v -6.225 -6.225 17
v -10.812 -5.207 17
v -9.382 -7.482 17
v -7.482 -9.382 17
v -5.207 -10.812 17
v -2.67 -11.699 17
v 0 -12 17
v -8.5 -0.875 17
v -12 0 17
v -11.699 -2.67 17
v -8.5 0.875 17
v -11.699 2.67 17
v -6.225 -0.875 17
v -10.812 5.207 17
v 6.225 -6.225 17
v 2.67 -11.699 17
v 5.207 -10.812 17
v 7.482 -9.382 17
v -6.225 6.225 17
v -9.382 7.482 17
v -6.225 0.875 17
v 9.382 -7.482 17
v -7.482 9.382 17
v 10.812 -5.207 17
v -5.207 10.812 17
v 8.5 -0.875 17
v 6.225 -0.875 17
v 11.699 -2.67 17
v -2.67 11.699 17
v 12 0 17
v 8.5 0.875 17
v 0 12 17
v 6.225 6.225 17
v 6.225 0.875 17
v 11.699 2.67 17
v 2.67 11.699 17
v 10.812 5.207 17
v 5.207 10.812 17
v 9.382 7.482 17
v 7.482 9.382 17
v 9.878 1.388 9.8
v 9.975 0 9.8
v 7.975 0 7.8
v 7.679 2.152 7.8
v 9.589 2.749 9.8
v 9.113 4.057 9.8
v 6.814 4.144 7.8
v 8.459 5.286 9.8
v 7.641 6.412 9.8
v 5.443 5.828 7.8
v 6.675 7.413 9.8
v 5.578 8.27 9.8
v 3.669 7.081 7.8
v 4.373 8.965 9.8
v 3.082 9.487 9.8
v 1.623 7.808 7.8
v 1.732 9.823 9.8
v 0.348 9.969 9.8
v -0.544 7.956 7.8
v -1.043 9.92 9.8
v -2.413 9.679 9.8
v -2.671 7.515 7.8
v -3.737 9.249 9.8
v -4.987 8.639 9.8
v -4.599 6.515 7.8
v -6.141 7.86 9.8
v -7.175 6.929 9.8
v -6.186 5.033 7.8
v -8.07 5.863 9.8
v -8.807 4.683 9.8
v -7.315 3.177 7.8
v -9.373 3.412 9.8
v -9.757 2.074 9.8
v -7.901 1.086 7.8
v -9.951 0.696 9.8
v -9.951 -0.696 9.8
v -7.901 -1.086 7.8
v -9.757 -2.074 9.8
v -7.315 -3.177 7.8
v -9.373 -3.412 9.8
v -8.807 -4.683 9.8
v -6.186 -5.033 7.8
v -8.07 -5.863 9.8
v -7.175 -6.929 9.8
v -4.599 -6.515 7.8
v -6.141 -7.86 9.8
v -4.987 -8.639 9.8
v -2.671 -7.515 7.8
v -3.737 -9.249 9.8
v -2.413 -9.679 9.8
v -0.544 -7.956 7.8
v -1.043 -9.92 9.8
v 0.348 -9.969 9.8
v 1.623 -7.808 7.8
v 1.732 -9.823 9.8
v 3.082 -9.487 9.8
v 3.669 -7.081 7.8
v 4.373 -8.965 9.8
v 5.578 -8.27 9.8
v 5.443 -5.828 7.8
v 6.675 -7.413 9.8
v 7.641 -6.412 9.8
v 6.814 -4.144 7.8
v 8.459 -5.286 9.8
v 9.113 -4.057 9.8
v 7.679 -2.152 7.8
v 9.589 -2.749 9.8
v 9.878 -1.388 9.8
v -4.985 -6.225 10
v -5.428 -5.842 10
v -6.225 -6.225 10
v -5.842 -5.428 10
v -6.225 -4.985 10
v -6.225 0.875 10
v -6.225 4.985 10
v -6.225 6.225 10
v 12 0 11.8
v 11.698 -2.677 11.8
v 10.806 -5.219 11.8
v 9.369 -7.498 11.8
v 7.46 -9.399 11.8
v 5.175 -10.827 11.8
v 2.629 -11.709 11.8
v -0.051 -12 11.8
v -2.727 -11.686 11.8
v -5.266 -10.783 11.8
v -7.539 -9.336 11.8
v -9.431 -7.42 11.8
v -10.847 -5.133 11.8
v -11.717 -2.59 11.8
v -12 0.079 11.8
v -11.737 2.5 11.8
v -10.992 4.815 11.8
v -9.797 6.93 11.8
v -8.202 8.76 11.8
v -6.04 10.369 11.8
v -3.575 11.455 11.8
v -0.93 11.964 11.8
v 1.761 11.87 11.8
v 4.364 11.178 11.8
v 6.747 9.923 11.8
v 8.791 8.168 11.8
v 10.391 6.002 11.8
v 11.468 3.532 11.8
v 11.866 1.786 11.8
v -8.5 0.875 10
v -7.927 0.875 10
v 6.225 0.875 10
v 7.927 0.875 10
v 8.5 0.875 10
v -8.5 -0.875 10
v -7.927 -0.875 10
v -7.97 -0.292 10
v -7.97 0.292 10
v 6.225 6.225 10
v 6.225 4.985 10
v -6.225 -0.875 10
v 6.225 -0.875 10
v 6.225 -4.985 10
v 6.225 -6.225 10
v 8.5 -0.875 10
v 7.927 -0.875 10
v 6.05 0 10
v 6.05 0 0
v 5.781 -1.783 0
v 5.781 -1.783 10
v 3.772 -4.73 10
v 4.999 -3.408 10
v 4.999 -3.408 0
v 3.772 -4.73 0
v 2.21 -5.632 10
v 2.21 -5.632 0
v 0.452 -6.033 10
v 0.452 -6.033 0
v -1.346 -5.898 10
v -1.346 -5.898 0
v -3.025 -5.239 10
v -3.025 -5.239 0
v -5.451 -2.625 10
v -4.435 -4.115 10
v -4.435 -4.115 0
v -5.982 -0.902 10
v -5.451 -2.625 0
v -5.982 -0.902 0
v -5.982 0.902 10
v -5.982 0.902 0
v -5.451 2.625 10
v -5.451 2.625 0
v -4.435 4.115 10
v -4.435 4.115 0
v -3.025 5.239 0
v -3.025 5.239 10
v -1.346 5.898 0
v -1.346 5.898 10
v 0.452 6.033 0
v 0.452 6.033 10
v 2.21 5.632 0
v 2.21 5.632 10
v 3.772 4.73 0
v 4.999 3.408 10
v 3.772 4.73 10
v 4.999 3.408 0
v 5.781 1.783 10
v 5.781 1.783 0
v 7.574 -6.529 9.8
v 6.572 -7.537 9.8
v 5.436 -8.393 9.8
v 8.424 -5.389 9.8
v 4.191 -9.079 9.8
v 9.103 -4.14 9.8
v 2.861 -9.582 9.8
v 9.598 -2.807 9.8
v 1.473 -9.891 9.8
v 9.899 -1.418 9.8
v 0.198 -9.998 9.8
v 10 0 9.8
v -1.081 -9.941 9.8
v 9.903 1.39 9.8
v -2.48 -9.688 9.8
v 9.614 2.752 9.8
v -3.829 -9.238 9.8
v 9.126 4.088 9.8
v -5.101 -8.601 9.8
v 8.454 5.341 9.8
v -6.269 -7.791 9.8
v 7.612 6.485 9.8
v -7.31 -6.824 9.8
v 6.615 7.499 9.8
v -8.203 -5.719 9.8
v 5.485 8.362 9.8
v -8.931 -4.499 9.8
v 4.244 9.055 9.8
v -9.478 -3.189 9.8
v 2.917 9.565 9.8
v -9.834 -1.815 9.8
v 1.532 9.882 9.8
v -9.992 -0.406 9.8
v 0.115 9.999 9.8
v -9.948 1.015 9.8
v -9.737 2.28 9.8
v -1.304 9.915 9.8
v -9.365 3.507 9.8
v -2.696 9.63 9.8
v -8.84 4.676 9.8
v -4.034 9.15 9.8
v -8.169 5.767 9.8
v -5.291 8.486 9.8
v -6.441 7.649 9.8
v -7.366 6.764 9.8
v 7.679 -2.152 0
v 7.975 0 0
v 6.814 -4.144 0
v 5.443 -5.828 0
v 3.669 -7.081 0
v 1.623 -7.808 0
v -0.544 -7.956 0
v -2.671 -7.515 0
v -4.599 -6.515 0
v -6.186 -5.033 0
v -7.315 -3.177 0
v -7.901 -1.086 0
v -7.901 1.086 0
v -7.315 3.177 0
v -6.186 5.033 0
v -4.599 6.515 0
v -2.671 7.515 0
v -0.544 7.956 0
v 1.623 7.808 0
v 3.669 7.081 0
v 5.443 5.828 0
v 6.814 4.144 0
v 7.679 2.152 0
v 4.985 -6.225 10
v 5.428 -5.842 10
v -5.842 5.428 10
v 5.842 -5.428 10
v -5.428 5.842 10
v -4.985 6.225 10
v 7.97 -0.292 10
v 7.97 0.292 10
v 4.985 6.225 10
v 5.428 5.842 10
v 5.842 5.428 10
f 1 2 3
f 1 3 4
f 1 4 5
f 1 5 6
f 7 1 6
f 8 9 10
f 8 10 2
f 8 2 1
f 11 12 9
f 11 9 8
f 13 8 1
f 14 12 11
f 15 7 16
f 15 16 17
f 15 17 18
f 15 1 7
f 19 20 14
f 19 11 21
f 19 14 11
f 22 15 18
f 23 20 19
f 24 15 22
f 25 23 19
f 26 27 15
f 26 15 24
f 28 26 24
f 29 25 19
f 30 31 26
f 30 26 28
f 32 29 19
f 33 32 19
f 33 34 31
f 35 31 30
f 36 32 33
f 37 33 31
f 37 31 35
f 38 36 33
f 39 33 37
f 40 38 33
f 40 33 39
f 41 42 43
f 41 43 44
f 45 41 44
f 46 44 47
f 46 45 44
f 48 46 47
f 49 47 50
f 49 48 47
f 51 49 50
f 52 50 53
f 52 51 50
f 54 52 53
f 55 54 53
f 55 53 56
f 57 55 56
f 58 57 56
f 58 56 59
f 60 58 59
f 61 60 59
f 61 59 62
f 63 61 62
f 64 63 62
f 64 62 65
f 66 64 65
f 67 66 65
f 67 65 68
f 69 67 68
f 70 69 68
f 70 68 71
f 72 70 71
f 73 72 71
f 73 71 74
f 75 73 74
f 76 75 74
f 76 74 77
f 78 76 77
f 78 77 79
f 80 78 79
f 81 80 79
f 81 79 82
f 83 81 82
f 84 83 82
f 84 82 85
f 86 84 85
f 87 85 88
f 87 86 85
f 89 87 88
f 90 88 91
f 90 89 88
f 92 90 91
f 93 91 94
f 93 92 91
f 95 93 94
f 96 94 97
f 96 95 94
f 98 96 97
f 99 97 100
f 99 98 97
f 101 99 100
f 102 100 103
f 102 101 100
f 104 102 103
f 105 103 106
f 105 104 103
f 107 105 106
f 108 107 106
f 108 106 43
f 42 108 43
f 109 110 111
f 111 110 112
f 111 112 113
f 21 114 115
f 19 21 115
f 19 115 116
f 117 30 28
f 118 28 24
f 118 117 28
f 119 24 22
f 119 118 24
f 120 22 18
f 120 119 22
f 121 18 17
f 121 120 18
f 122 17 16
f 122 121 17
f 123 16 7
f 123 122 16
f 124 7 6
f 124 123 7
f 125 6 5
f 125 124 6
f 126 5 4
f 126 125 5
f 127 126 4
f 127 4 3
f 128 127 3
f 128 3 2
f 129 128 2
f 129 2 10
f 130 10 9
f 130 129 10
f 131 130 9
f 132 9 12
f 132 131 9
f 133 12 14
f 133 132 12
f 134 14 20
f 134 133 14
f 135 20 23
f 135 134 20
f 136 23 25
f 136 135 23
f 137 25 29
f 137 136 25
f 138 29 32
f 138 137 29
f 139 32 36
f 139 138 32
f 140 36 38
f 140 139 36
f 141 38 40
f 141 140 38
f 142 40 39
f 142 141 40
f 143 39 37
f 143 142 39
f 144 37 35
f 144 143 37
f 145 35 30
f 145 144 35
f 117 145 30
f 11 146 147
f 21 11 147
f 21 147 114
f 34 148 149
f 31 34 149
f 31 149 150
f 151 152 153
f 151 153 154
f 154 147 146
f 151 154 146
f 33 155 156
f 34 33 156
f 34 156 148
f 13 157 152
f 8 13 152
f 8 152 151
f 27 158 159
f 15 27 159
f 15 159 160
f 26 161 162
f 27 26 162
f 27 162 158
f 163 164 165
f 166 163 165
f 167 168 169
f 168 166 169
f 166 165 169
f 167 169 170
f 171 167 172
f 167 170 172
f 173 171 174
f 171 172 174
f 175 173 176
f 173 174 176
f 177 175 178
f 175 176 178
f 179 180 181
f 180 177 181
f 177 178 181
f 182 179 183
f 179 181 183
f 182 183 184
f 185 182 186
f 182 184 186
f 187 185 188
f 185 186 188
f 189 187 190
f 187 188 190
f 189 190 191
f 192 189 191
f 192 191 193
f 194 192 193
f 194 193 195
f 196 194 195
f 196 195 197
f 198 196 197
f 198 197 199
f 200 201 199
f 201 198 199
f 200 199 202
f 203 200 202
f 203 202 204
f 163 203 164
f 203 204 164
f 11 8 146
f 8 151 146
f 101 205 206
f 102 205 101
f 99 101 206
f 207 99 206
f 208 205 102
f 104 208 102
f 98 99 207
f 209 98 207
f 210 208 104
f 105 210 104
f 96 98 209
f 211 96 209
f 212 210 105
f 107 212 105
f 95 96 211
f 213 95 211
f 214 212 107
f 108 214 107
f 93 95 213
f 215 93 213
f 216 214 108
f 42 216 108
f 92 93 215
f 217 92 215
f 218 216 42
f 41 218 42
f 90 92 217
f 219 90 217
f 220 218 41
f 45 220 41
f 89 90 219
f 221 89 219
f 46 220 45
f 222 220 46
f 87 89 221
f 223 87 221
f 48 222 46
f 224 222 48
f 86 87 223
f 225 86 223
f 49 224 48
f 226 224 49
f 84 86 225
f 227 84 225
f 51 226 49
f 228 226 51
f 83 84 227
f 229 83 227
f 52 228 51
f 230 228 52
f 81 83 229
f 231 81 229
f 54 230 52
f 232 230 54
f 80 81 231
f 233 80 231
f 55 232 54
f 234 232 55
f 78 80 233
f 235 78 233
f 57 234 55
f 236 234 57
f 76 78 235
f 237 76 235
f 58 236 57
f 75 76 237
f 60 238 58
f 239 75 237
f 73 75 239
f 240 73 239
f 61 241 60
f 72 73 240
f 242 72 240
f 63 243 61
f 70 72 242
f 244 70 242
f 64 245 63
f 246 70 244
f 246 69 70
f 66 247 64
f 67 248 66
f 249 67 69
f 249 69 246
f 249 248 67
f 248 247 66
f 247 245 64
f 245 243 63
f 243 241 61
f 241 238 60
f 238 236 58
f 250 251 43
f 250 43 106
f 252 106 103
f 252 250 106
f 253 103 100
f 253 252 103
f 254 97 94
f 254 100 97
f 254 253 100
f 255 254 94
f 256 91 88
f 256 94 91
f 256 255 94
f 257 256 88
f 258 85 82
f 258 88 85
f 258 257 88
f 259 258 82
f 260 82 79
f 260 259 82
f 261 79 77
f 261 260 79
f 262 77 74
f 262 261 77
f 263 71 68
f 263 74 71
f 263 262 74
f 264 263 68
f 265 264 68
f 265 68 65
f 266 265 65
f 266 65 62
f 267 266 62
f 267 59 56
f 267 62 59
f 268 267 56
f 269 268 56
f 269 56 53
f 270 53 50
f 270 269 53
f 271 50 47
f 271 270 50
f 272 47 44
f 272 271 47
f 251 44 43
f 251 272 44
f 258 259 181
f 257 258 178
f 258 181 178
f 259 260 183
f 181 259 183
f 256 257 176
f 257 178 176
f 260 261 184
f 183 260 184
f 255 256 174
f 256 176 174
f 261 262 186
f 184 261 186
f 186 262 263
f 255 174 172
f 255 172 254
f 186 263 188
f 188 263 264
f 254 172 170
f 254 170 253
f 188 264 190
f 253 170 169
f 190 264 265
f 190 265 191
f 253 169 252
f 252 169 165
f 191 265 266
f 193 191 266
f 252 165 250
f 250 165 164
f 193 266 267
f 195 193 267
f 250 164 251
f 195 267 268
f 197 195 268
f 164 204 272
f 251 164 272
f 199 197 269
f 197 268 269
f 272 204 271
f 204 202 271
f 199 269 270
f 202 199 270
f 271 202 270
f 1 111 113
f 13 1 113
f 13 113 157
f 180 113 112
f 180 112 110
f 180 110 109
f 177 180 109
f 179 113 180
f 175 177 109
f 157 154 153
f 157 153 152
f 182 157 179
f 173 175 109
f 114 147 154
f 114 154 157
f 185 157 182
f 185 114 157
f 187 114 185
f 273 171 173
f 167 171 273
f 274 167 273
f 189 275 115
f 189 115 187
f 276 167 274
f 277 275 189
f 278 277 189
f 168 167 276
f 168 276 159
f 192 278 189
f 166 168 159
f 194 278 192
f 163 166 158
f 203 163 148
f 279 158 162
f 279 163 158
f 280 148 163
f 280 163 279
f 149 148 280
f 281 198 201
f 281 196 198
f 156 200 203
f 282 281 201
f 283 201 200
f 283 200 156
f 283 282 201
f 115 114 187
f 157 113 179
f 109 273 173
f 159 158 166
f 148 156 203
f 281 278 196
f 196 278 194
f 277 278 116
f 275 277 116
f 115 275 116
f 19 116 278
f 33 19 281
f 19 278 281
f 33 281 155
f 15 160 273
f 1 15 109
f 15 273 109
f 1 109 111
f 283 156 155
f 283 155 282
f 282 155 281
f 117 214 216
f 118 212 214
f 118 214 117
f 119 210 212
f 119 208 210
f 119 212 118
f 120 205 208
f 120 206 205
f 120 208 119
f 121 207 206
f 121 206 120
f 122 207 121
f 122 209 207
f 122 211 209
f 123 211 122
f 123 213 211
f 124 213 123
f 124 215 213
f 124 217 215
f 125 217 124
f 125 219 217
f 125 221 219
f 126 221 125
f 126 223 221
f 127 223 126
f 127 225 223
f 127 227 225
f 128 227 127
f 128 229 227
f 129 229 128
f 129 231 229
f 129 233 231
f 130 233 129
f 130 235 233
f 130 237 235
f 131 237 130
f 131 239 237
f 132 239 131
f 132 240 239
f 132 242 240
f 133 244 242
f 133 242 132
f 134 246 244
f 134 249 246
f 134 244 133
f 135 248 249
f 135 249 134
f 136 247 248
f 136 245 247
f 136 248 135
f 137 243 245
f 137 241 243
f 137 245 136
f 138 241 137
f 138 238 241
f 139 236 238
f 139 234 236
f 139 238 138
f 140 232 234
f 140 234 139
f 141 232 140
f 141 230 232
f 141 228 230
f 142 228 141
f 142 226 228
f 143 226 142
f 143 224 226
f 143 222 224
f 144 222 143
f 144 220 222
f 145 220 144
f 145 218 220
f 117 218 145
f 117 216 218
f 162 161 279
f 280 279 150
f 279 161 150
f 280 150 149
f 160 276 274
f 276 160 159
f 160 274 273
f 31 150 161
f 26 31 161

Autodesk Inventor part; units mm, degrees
ref_plane "YZ Plane" through (0, 0, 0) normal (1, 0, 0) x (0, 1, 0)
ref_plane "XZ Plane" through (0, 0, 0) normal (0, 1, 0) x (-1, 0, 0)
ref_plane "XY Plane" through (0, 0, 0) normal (0, 0, 1) x (1, 0, 0)
sketch "Sketch1" plane through (0, 0, 0) normal (0, 0, 1) x (1, 0, 0)
  circle A0 centre (0, 0) radius 7.975
  circle A1 centre (0, 0) radius 6.05
  dimension "d0" = 15.95
  dimension "d1" = 12.1
extrude "Extrusion1" add sketch "Sketch1" along normal blind 10
sketch "Sketch2" plane through (0, 0, 10) normal (0, 0, 1) x (1, 0, 0)
  circle A0 centre (0, 0) radius 7.975 projected
  line L0 (-6.225, 6.225) -> (6.225, 6.225)
  line L1 (6.225, 6.225) -> (6.225, -6.225)
  line L2 (6.225, -6.225) -> (-6.225, -6.225)
  line L3 (-6.225, -6.225) -> (-6.225, 6.225)
  line L4 (-6.225, 6.225) -> (6.225, -6.225) construction
  line L5 (6.225, 6.225) -> (-6.225, -6.225) construction
  line L6 (-8.5, 0.875) -> (8.5, 0.875)
  line L7 (8.5, 0.875) -> (8.5, -0.875)
  line L8 (8.5, -0.875) -> (-8.5, -0.875)
  line L9 (-8.5, -0.875) -> (-8.5, 0.875)
  line L10 (-8.5, 0.875) -> (8.5, -0.875) construction
  line L11 (8.5, 0.875) -> (-8.5, -0.875) construction
  circle A1 centre (0, 0) radius 12
  point P0 (4.985, -6.225)
  point P1 (-4.985, -6.225)
  point P2 (7.9269, -0.875)
  point P3 (6.225, -0.875)
  point P4 (6.225, -4.985)
  point P5 (-6.225, -0.875)
  point P6 (-7.9269, -0.875)
  point P7 (-6.225, -4.985)
  point P8 (6.225, 0.875)
  point P9 (7.9269, 0.875)
  point P10 (6.225, 4.985)
  point P11 (-7.9269, 0.875)
  point P12 (-6.225, 0.875)
  point P13 (-6.225, 4.985)
  point P14 (-4.985, 6.225)
  point P15 (4.985, 6.225)
  dimension "d4" = 12.45
  dimension "d5" = 12.45
  dimension "d6" = 17
  dimension "d7" = 1.75
  dimension "d10" = 24
extrude "Extrusion2" add sketch "Sketch2" along normal blind 7 contours L6 L1 A0 | A0 L1 L8 | L0 A0 | L6 A0 L3 | A0 L2 | L3 A0 L8 | A1
sketch "Sketch3" plane through (0, 0, 10) normal (0, 0, -1) x (-1, 0, 0)
  circle A0 centre (0, 0) radius 7.975 projected
  circle A1 centre (0, 0) radius 12 projected
extrude "Extrusion3" add sketch "Sketch3" along normal blind 0.2
chamfer "Chamfer1" distance 2 angle 45 1 edges at (-7.975, 0, 9.8)
chamfer "Chamfer2" distance 2 angle 45 1 edges at (12, 0, 9.8)
properties part number "CouplerAdapter"
